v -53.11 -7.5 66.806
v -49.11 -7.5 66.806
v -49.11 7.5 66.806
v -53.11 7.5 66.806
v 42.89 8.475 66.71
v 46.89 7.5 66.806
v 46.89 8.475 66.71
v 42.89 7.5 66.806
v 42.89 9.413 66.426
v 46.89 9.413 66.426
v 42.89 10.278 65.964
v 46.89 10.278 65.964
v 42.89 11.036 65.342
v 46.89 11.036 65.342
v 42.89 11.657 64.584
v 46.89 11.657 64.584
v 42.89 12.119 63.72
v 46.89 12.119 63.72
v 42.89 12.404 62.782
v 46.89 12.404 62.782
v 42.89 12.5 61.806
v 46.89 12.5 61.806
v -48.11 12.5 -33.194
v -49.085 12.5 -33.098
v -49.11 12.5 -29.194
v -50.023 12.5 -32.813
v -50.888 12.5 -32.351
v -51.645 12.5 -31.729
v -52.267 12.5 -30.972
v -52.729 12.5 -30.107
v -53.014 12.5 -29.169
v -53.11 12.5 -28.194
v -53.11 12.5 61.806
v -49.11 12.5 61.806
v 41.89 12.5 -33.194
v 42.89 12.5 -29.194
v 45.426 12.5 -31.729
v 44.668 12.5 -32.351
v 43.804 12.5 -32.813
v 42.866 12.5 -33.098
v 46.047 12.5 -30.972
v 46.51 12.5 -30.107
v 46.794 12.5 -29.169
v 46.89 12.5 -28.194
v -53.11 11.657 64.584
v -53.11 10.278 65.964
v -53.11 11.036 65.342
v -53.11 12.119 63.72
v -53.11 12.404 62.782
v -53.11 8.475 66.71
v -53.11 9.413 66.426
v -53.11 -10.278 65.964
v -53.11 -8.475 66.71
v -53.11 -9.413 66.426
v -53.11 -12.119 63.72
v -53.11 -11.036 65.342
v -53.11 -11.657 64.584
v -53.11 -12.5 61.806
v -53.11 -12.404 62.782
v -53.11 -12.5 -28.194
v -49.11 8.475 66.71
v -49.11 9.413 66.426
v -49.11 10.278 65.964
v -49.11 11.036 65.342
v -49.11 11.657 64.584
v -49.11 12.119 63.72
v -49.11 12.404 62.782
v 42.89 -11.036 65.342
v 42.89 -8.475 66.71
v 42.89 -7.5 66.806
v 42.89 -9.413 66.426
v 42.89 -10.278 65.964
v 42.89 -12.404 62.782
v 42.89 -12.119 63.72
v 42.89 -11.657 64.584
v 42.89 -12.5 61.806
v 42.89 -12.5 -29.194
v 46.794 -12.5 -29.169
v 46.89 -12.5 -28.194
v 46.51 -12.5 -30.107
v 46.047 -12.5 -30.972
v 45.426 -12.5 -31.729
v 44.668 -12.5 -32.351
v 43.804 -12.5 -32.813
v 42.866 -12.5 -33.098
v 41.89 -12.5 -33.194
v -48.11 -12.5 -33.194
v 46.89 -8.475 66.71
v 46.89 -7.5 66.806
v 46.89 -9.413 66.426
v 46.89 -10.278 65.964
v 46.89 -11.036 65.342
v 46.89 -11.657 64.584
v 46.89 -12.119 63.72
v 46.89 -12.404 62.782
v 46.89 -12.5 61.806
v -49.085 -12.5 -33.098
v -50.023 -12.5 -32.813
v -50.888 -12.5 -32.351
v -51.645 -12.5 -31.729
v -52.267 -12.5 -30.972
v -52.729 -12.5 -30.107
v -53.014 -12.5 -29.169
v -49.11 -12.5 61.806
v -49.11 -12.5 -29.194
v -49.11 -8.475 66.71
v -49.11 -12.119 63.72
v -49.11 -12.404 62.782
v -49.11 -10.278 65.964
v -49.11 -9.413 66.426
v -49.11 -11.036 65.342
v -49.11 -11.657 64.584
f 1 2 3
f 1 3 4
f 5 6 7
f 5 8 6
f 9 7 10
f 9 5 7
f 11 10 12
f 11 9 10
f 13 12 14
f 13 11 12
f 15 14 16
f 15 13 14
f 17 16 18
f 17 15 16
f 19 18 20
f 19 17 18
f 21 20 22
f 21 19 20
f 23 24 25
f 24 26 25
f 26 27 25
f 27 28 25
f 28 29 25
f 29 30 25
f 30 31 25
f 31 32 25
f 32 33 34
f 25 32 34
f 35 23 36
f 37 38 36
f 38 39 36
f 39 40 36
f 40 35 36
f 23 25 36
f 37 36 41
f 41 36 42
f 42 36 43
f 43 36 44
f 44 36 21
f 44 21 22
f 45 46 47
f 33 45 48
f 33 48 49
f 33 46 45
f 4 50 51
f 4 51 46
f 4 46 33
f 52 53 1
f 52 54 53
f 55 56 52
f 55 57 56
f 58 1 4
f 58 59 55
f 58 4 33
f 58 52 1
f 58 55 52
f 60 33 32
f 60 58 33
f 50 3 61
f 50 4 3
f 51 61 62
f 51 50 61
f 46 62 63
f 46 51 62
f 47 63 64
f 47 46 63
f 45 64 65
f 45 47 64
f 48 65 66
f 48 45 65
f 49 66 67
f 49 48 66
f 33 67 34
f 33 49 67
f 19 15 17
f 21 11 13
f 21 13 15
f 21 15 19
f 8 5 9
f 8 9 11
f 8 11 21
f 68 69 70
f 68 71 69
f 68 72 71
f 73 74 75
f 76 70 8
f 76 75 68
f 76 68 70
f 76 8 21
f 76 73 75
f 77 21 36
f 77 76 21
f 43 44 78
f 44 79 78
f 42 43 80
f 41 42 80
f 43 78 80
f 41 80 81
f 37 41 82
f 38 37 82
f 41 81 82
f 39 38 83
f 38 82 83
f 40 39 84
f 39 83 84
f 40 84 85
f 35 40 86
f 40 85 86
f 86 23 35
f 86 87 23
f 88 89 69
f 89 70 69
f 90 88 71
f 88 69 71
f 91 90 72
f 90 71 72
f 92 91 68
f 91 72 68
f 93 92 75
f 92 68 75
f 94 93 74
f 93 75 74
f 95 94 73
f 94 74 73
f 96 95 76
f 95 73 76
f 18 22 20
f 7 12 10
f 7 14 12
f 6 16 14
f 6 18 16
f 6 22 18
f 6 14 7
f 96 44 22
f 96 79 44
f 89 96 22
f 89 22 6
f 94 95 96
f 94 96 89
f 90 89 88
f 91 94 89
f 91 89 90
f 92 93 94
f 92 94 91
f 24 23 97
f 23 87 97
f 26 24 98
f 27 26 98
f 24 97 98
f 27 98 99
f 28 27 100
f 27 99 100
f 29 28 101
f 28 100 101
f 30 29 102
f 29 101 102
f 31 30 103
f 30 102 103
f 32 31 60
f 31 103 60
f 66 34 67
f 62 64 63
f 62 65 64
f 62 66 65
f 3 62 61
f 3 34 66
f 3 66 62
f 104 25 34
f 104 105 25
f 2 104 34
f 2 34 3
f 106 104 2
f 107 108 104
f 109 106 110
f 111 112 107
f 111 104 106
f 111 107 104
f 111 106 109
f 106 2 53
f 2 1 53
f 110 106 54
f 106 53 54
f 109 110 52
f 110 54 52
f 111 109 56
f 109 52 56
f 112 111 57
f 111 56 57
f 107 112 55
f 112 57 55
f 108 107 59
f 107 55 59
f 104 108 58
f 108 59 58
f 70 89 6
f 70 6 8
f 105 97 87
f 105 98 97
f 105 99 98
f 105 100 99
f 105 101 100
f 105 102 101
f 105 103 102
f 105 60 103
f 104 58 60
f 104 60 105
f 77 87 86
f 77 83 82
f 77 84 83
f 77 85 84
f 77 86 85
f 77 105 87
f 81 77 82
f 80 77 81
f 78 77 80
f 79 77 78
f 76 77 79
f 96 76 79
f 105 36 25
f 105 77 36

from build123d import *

# Parameters (mm, degrees)
F1_DEPTH = 12.5
F2_R     = 5


# Not quite as in the source:
# - a feature names something its author has since deleted; it is built from what else it names


with BuildPart() as f1:
    # F0 (on Front) → F1 (new body, symmetric)
    with BuildSketch(Plane.XZ):
        Polygon((-49.1098842621, 66.8063223362), (-53.1098842621, 66.8063223362), (-53.1098842621, -33.1936776638), (46.8901157379, -33.1936776638), (46.8901157379, 66.8063223362), (42.8901157379, 66.8063223362), (42.8901157379, -29.1936776638), (-49.1098842621, -29.1936776638), align=None)
    extrude(amount=F1_DEPTH, both=True)

    # F2
    f2_edges = [f1.edges().sort_by_distance(p)[0] for p in [
        (-51.109884, -12.5, 66.806322),
        (-51.109884, 12.5, 66.806322),
        (44.890116, -12.5, 66.806322),
        (44.890116, 12.5, 66.806322),
        (46.890116, 0, -33.193678),
        (-53.109884, 0, -33.193678),
    ]]
    fillet(f2_edges, radius=F2_R)


solid = f1.part
